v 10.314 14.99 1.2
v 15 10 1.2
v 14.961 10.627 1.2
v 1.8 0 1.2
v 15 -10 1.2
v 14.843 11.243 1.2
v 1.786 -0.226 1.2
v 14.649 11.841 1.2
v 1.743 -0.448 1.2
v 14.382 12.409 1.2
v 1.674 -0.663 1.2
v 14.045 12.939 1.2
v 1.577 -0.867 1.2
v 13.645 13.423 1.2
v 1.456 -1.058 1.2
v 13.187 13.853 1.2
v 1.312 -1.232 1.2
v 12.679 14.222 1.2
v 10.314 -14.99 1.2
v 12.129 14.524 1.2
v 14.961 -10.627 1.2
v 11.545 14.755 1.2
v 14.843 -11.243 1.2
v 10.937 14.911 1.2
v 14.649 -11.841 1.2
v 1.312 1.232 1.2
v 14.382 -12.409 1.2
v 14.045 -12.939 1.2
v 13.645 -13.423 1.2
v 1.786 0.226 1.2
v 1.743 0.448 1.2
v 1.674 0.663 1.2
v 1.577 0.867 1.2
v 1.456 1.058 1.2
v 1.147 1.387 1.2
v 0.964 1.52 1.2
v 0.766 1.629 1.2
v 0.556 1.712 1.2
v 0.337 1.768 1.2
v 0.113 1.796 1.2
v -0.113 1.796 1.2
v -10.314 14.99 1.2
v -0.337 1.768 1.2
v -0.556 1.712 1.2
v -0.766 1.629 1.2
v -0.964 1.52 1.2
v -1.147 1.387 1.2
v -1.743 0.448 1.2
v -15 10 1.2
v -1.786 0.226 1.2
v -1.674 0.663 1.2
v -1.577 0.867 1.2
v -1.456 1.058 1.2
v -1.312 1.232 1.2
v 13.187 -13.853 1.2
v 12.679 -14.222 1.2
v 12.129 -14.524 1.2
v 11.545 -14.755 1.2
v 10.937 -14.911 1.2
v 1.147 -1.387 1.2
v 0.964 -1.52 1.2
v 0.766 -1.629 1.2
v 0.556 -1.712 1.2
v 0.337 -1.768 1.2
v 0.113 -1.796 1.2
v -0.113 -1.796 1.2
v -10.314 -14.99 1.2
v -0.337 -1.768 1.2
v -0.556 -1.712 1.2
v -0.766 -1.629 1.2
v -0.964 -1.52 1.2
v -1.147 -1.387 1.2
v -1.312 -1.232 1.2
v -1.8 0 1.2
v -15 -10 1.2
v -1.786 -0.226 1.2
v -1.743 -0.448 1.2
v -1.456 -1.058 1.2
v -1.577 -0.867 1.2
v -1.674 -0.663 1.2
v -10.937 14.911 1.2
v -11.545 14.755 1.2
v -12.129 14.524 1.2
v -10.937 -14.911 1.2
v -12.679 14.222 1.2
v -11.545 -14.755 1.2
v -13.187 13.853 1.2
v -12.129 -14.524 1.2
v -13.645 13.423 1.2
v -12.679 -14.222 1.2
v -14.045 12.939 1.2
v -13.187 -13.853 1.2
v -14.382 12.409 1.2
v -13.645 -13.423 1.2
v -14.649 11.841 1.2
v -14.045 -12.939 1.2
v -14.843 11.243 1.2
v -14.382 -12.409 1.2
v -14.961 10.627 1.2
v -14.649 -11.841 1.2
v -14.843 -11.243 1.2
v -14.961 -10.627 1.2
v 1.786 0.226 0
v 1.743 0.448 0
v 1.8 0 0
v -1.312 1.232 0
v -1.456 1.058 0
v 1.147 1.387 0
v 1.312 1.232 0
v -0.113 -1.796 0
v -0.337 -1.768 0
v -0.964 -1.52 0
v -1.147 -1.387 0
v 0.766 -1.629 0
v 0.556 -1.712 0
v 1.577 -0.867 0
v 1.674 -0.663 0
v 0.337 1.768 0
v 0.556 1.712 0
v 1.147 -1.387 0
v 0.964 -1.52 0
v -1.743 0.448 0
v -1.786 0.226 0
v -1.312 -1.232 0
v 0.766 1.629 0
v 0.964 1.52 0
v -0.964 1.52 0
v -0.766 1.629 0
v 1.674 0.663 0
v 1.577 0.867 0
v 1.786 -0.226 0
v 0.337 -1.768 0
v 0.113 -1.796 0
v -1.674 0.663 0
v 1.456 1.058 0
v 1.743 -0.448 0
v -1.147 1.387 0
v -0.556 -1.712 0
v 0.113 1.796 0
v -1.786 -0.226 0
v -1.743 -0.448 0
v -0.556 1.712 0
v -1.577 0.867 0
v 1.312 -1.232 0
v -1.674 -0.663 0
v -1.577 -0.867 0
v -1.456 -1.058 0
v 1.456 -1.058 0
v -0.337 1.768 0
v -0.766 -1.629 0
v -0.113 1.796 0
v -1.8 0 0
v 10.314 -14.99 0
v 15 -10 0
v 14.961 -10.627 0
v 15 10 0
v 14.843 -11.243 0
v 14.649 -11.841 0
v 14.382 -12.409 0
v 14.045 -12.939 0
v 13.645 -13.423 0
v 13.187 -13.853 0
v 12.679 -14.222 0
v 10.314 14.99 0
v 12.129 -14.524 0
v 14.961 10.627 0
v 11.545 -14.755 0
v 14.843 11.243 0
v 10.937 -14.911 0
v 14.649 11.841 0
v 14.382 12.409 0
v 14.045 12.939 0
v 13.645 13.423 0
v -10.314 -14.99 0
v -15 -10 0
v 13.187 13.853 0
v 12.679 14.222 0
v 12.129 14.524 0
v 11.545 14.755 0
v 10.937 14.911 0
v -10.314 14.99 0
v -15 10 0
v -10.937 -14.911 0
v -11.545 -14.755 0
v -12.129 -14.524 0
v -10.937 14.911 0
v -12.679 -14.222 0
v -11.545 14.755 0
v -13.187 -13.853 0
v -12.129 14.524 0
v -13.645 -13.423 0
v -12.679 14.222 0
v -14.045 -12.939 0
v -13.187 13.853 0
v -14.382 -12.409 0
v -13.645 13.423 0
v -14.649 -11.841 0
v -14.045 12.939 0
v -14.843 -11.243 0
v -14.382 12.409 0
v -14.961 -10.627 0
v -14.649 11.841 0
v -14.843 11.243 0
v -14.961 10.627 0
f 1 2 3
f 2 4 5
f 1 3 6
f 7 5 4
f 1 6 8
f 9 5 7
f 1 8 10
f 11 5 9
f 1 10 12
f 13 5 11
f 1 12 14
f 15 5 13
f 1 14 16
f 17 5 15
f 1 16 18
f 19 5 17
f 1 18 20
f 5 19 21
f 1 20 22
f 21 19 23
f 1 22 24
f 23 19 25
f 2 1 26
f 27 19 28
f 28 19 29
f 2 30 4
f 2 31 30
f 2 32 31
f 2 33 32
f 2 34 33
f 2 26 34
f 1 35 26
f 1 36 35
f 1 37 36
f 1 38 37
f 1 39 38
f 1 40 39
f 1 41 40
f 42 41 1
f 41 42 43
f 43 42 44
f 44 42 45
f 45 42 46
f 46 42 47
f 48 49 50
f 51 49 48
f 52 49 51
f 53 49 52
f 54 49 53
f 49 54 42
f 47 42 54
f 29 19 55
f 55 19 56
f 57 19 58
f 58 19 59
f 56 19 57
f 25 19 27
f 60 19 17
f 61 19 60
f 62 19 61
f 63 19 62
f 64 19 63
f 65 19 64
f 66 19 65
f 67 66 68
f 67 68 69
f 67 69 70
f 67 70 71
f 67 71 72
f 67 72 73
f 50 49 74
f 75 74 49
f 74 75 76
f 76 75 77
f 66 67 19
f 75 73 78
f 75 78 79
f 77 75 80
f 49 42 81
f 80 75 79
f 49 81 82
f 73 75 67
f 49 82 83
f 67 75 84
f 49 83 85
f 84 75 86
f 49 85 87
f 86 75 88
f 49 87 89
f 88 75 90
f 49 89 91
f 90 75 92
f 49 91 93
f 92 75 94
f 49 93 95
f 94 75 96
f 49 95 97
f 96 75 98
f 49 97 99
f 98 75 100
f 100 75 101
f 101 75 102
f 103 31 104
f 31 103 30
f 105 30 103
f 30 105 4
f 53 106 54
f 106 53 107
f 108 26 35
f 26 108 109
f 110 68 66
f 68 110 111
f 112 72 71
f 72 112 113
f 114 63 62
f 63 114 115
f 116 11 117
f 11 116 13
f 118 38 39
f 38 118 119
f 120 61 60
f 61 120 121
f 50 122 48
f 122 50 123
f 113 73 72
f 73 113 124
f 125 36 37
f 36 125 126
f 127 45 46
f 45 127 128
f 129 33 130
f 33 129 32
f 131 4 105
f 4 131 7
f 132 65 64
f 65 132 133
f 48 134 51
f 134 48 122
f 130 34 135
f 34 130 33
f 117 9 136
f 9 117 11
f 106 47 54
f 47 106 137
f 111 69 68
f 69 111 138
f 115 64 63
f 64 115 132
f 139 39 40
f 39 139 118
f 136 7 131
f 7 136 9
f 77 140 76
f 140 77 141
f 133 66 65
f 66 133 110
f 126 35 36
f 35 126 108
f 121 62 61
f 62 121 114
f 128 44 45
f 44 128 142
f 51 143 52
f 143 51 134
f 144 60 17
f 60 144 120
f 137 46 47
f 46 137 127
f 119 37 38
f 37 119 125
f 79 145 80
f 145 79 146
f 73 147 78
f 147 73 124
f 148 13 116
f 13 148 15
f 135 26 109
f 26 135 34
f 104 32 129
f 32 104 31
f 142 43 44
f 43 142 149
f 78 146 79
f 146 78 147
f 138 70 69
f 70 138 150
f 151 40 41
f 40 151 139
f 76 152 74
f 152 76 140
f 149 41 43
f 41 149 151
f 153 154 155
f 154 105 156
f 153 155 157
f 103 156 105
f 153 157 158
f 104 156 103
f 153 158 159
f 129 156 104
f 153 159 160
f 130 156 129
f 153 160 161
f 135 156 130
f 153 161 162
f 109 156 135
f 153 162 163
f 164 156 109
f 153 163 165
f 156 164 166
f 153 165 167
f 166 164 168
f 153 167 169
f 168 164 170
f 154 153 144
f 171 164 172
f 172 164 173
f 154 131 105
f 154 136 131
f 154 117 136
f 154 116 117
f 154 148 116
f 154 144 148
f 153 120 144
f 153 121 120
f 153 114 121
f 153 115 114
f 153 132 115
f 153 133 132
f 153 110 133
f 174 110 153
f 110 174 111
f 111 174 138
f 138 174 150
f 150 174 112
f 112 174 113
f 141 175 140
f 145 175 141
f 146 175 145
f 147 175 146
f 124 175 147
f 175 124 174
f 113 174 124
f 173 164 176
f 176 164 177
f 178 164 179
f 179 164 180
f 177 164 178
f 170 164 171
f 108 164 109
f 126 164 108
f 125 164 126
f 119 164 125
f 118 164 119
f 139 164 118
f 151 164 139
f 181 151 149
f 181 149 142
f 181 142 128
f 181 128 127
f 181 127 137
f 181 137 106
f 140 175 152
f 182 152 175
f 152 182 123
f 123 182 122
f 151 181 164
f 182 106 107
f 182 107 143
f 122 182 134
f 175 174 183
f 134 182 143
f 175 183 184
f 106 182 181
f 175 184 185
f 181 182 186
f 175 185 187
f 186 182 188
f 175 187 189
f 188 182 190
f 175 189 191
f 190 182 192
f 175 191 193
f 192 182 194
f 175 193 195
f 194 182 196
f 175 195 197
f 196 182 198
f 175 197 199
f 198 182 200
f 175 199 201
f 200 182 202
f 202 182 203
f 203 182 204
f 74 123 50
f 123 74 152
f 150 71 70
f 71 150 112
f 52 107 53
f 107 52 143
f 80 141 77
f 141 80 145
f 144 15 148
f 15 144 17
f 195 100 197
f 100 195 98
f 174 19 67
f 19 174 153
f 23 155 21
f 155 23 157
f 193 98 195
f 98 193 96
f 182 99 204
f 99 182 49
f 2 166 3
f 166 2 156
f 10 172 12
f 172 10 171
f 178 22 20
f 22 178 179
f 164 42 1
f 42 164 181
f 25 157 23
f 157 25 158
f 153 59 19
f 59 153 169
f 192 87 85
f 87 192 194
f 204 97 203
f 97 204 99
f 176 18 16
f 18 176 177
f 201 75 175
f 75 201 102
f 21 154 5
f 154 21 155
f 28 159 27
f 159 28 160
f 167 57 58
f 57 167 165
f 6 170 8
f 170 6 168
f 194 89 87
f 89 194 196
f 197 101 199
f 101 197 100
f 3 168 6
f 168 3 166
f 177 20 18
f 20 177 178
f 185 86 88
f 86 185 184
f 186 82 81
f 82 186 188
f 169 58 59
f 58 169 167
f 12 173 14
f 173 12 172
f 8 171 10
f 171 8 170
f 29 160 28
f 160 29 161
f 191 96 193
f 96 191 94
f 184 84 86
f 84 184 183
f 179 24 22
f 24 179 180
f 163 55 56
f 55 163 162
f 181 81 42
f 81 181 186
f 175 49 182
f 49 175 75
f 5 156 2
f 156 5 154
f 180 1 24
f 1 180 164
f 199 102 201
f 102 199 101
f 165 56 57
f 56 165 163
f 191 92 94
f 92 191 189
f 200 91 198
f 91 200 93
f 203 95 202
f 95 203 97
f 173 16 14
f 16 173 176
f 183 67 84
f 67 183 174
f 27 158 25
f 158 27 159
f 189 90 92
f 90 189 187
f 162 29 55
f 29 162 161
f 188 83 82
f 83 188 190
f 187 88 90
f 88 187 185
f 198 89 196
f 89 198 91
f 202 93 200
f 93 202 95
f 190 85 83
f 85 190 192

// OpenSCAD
$fn = 50;


difference() {
	union() {
		hull() {
			translate(v = [-10.0000000000, 10.0000000000, 0]) {
				cylinder(h = 21, r = 5);
			}
			translate(v = [10.0000000000, 10.0000000000, 0]) {
				cylinder(h = 21, r = 5);
			}
			translate(v = [-10.0000000000, -10.0000000000, 0]) {
				cylinder(h = 21, r = 5);
			}
			translate(v = [10.0000000000, -10.0000000000, 0]) {
				cylinder(h = 21, r = 5);
			}
		}
	}
	union() {
		translate(v = [0, 0, 1.2000000000]) {
			hull() {
				translate(v = [-10.0000000000, 10.0000000000, 0]) {
					cylinder(h = 19.8000000000, r = 3.8000000000);
				}
				translate(v = [10.0000000000, 10.0000000000, 0]) {
					cylinder(h = 19.8000000000, r = 3.8000000000);
				}
				translate(v = [-10.0000000000, -10.0000000000, 0]) {
					cylinder(h = 19.8000000000, r = 3.8000000000);
				}
				translate(v = [10.0000000000, -10.0000000000, 0]) {
					cylinder(h = 19.8000000000, r = 3.8000000000);
				}
			}
		}
		#cylinder(h = 1.2000000000, r = 1.8000000000);
		translate(v = [-250.0000000000, -250.0000000000, 1.2000000000]) {
			cube(size = [500, 500, 500]);
		}
		translate(v = [-250.0000000000, -250.0000000000, 1.2000000000]) {
			cube(size = [500, 500, 500]);
		}
		translate(v = [-250.0000000000, -250.0000000000, 1.2000000000]) {
			cube(size = [500, 500, 500]);
		}
	}
}
